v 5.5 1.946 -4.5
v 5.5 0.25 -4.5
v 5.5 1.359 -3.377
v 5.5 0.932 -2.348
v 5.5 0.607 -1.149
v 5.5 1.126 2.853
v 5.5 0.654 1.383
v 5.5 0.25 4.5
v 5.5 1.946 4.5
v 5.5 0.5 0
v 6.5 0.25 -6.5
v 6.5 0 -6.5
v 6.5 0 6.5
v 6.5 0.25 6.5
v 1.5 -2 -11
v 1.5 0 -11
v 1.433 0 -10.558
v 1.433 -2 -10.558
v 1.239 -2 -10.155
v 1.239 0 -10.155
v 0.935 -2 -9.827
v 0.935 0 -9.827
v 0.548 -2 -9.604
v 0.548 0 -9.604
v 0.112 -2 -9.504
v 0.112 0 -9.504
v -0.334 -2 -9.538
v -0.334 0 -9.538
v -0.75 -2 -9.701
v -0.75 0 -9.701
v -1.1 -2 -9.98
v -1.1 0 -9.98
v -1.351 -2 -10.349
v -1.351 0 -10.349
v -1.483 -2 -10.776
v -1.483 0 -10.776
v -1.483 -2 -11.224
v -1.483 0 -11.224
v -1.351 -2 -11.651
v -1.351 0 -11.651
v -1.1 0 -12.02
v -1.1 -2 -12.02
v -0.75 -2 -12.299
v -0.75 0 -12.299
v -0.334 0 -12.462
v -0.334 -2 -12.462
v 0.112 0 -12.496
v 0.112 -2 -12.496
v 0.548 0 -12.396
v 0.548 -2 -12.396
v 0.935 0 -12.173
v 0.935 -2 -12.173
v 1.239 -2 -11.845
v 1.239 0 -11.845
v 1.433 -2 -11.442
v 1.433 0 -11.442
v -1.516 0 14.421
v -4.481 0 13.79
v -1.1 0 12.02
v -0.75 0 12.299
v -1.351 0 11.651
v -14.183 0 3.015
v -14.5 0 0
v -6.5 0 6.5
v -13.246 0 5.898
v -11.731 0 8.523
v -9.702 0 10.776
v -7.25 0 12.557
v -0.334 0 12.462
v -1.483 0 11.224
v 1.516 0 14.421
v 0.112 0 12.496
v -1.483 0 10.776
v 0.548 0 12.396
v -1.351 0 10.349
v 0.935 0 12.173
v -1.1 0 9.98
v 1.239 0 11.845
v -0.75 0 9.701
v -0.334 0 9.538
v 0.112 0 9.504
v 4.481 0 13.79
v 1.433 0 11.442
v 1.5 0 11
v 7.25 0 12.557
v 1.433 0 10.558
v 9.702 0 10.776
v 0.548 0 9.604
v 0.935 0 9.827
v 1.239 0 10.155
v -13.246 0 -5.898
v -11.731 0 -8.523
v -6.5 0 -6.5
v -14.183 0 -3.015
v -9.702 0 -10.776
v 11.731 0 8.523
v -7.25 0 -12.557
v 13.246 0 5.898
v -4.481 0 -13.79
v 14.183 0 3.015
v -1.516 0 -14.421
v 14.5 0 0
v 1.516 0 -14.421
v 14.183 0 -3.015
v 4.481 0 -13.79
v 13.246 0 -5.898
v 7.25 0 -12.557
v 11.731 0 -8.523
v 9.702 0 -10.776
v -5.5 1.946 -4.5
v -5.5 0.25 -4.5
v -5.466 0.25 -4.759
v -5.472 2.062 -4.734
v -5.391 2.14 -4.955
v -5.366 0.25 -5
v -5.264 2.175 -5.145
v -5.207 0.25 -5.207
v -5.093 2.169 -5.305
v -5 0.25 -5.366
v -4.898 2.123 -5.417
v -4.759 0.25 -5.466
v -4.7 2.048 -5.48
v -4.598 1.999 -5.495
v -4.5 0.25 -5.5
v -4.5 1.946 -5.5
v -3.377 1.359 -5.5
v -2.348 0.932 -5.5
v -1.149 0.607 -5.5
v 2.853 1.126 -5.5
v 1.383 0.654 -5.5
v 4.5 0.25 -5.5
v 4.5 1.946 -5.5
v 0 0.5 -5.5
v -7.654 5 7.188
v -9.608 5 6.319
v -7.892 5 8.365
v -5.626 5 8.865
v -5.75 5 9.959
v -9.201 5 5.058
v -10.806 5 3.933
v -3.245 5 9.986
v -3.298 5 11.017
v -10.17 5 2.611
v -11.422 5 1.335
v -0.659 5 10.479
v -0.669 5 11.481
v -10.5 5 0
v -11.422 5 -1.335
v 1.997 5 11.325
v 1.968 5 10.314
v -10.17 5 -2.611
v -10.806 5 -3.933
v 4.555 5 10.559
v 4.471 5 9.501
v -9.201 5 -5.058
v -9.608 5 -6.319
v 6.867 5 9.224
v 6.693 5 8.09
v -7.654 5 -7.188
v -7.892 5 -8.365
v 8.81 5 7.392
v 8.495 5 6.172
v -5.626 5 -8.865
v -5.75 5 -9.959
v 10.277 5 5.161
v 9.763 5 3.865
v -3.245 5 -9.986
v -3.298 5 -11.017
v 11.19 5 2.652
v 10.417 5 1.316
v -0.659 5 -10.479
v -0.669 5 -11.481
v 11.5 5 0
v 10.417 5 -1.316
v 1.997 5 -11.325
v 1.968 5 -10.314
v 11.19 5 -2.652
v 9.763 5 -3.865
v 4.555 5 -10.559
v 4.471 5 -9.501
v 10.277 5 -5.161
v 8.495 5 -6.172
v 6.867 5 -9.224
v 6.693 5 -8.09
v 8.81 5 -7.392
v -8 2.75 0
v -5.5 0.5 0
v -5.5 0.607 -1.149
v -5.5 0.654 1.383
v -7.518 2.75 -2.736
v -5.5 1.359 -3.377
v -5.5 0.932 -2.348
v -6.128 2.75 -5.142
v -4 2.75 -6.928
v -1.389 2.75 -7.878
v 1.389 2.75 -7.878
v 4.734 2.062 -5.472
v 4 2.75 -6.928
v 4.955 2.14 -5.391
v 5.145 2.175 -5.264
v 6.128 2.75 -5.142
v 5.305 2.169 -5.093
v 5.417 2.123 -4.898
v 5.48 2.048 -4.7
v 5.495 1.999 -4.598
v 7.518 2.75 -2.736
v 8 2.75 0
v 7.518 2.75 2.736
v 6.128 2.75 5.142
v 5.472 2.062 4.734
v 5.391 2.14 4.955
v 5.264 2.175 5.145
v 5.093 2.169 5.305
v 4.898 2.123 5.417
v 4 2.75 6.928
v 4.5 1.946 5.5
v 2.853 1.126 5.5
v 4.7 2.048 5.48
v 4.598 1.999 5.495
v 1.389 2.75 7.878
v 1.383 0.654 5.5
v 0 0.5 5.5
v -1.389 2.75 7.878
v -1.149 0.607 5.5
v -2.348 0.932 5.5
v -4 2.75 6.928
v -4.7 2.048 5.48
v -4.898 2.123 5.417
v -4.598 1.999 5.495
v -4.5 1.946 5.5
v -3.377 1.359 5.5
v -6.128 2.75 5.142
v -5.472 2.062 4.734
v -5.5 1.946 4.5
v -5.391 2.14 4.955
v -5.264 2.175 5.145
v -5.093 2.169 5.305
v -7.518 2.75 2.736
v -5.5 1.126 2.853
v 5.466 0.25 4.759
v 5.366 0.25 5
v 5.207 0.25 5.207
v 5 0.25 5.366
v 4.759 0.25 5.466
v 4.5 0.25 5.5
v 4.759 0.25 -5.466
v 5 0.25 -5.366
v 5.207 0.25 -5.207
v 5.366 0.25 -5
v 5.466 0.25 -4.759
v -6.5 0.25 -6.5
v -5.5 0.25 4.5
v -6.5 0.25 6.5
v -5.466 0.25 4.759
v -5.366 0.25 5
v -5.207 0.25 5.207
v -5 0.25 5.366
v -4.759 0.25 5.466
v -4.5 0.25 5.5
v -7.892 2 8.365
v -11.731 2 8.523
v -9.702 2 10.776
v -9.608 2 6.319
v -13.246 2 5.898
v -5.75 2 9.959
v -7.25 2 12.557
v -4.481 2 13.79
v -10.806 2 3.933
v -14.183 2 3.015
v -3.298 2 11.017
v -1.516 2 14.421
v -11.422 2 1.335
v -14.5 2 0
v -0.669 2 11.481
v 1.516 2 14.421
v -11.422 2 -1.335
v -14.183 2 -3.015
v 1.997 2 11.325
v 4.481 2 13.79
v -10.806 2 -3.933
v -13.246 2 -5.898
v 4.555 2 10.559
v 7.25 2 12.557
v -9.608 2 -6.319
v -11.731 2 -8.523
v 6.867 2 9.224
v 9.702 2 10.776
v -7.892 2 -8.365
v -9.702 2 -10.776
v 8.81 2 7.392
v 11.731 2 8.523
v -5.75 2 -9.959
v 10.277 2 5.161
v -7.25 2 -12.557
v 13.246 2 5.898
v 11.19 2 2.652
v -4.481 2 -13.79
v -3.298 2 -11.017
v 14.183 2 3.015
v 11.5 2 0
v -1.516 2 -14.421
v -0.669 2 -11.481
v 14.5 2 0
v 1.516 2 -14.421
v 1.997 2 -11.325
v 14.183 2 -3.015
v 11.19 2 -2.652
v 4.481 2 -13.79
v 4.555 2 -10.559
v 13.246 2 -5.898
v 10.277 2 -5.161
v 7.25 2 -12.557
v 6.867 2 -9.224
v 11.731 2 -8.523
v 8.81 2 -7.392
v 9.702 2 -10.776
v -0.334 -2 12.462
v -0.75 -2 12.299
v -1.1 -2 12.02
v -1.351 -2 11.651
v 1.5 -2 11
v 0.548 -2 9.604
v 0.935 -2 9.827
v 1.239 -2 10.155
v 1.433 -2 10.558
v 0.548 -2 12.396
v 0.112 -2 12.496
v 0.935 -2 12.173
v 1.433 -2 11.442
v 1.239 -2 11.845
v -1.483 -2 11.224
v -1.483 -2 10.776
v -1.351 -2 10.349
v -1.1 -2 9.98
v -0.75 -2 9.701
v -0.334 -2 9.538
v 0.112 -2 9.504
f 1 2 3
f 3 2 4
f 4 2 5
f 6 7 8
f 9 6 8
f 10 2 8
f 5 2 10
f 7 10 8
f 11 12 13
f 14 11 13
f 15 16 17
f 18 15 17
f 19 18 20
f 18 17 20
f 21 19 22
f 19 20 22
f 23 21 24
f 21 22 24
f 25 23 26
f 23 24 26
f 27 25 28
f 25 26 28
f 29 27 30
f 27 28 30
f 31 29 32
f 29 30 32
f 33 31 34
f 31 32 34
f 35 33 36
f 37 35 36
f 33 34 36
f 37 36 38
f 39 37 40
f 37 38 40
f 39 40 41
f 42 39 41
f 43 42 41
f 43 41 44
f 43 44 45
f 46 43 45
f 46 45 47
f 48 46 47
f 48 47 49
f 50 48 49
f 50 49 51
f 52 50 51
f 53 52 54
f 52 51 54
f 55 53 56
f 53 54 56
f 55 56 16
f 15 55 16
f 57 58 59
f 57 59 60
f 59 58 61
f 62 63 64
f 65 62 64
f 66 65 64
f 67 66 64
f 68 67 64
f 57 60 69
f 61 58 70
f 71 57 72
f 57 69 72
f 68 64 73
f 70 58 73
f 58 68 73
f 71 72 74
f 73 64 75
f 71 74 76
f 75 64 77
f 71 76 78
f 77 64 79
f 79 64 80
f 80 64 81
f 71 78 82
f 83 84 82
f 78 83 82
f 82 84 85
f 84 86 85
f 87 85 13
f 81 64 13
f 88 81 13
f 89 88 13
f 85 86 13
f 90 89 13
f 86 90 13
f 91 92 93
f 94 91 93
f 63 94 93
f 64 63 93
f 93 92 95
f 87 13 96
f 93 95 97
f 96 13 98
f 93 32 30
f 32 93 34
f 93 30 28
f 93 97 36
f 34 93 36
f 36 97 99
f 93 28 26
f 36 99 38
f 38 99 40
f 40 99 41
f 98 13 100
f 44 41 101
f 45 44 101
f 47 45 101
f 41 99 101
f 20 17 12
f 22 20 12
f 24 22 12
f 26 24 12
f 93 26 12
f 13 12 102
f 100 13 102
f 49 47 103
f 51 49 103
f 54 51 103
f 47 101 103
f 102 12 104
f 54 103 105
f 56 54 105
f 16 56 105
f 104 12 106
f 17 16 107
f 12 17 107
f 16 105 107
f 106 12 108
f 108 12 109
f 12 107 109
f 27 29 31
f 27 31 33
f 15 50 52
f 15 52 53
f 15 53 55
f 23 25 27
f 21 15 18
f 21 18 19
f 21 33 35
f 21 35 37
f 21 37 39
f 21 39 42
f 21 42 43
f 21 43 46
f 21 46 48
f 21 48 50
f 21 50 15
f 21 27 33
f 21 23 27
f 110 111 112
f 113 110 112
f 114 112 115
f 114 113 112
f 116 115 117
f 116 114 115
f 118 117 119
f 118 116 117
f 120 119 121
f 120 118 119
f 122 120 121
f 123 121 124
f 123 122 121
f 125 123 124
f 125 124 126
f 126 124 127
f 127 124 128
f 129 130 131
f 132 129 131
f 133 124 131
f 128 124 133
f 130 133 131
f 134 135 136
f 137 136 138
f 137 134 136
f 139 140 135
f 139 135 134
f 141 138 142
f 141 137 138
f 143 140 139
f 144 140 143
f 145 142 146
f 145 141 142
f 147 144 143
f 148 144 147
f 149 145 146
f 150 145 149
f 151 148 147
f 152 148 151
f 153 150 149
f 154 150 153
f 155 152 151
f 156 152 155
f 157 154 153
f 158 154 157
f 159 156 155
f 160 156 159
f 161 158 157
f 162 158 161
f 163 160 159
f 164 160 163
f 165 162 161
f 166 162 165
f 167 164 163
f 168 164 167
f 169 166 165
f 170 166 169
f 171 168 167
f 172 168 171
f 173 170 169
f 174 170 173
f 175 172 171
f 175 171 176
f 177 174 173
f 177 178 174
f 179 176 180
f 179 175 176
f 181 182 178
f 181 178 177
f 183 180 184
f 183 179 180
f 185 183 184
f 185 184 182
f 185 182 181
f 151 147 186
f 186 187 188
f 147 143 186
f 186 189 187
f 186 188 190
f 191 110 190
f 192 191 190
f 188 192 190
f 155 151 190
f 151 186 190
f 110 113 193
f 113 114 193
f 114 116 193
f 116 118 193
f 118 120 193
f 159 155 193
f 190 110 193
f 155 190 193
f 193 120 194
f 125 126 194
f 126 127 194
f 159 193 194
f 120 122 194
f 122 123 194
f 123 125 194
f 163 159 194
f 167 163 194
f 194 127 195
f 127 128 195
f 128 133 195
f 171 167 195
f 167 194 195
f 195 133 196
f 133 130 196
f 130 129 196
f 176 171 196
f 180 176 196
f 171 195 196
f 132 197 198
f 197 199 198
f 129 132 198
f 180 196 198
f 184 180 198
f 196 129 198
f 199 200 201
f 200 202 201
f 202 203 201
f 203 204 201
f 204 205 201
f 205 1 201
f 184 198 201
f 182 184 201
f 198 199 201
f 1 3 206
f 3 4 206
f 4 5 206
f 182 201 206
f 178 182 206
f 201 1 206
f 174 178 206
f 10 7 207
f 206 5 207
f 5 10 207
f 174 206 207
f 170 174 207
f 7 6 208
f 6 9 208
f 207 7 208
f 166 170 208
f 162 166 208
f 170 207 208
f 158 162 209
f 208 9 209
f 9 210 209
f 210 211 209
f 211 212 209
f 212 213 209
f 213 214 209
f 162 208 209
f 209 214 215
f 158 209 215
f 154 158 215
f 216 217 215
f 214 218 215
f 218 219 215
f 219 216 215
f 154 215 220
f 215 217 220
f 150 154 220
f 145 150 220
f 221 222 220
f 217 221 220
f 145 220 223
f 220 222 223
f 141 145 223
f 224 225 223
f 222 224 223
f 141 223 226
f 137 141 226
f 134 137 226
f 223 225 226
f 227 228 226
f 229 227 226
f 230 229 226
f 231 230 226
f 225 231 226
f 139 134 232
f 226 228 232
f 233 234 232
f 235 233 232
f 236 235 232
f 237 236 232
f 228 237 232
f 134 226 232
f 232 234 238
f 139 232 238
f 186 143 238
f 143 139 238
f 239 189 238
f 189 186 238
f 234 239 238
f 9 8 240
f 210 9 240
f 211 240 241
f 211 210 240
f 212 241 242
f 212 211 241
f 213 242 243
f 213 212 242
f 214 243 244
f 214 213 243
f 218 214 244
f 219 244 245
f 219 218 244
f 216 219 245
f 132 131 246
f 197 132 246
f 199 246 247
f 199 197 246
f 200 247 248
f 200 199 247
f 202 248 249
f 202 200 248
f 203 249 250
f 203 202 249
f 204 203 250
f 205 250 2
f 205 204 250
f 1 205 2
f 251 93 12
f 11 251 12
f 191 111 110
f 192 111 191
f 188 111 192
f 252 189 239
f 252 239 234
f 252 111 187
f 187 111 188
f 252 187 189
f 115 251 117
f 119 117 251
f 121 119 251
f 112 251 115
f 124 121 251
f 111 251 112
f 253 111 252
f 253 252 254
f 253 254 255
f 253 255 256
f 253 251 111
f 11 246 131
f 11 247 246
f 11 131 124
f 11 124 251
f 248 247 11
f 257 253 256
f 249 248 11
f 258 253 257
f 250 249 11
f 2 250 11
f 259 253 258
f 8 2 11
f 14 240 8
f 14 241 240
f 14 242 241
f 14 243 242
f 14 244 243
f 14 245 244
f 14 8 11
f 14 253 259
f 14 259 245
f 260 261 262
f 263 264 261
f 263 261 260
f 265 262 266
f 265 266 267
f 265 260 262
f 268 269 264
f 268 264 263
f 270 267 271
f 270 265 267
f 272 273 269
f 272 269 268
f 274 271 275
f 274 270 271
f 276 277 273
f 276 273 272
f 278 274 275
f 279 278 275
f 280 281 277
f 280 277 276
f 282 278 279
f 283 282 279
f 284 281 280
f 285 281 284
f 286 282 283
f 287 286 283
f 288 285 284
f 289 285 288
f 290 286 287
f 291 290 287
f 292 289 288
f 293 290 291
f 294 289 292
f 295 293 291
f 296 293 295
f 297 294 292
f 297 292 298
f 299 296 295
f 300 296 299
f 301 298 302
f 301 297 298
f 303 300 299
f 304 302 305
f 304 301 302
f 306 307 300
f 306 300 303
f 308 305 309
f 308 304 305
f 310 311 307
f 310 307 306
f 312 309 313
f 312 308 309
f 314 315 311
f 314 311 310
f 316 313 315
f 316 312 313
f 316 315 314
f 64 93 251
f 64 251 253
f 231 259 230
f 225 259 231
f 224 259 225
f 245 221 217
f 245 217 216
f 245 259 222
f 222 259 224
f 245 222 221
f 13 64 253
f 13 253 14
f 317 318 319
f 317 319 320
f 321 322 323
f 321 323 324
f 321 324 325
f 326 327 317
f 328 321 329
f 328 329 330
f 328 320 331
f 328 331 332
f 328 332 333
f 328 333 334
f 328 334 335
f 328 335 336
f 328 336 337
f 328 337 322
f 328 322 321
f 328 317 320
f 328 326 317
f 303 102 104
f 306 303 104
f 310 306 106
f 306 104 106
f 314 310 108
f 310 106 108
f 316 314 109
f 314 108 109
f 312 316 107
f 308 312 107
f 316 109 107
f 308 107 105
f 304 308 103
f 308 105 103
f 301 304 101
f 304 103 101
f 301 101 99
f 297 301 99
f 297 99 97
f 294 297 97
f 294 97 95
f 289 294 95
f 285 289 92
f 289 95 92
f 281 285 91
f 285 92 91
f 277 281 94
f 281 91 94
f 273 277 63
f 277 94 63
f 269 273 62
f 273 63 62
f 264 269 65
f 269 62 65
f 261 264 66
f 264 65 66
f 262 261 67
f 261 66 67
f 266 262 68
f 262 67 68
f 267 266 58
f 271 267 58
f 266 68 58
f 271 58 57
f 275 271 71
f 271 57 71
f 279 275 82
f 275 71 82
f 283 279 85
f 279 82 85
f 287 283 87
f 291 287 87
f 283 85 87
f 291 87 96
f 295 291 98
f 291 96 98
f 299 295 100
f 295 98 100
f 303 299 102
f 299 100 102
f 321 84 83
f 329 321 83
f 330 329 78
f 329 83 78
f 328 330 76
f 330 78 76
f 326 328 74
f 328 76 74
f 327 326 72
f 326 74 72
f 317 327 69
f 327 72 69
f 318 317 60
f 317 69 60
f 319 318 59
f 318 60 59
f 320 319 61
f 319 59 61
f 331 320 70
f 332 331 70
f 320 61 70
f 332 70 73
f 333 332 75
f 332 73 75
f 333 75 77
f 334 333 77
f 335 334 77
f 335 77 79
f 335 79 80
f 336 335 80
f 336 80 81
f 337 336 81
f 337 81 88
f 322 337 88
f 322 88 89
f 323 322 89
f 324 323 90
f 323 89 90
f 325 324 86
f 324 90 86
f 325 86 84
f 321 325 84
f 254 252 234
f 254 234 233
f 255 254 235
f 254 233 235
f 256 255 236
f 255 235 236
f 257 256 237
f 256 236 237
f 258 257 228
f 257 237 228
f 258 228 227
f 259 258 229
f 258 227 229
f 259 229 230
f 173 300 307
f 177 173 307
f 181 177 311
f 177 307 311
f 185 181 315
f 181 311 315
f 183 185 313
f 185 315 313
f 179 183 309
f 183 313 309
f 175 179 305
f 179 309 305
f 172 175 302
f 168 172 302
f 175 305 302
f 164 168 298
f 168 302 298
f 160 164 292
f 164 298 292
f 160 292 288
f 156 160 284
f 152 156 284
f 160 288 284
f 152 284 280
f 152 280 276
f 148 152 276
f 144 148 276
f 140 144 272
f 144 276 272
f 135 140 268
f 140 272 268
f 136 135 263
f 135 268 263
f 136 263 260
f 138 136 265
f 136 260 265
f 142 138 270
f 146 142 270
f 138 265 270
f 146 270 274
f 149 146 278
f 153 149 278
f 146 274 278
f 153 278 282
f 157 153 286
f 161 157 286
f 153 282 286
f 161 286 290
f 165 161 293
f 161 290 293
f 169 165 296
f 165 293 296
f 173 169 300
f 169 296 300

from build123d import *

# Parameters (mm, degrees)
SKETCH1_R         = 14.5
BODY_DEPTH        = 2
SKETCH2_R         = 1.5
FIXHOLES_DEPTH    = 2
SKETCH3_R         = 11.5
BODY2_DEPTH       = 3
SKETCH5_W         = 11
SKETCH5_H         = 11
WINDOW_HOLE_DEPTH = 12
SKETCH7_W         = 13
SKETCH7_H         = 13
WINDOW_DEPTH      = 0.25
WINDOW_FILLET_R   = 1


with BuildPart() as part:
    # Sketch1 → Body (new body)
    with BuildSketch(Plane(origin=(0, 0, 0), x_dir=(1, 0, 0), z_dir=(0, 1, 0))):
        Circle(SKETCH1_R)
    extrude(amount=BODY_DEPTH)

    # Sketch2 → FixHoles (add)
    with BuildSketch(Plane.XZ):
        with Locations((0, 11)):
            Circle(SKETCH2_R)
        with Locations((0, -11)):
            Circle(SKETCH2_R)
    extrude(amount=FIXHOLES_DEPTH)

    # Sketch3 → Body2 (add)
    with BuildSketch(Plane(origin=(0, 2, 0), x_dir=(1, 0, 0), z_dir=(0, 1, 0))):
        Circle(SKETCH3_R)
    extrude(amount=BODY2_DEPTH)

    # Sketch5 → Window_hole (cut)
    with BuildSketch(Plane.XZ):
        Rectangle(SKETCH5_W, SKETCH5_H)
    extrude(amount=-WINDOW_HOLE_DEPTH, mode=Mode.SUBTRACT)

    # Sketch6 → Objective_cut (revolve, cut)
    with BuildSketch(Plane.XY):
        Polygon((-5.5, 5), (-10.5, 5), (-5.5, 0.5), align=None)
    revolve(axis=Axis((0, 7.375311512, 0), (0, -1, 0)), mode=Mode.SUBTRACT)

    # Sketch7 → Window (cut)
    with BuildSketch(Plane.XZ):
        Rectangle(SKETCH7_W, SKETCH7_H)
    extrude(amount=-WINDOW_DEPTH, mode=Mode.SUBTRACT)

    # Window_Fillet
    window_fillet_edges = [part.edges().sort_by_distance(p)[0] for p in [
        (-5.5, 1.400178567, 5.5),
        (5.5, 1.400178567, 5.5),
        (5.5, 1.400178567, -5.5),
        (-5.5, 1.400178567, -5.5),
    ]]
    fillet(window_fillet_edges, radius=WINDOW_FILLET_R)


solid = part.part
